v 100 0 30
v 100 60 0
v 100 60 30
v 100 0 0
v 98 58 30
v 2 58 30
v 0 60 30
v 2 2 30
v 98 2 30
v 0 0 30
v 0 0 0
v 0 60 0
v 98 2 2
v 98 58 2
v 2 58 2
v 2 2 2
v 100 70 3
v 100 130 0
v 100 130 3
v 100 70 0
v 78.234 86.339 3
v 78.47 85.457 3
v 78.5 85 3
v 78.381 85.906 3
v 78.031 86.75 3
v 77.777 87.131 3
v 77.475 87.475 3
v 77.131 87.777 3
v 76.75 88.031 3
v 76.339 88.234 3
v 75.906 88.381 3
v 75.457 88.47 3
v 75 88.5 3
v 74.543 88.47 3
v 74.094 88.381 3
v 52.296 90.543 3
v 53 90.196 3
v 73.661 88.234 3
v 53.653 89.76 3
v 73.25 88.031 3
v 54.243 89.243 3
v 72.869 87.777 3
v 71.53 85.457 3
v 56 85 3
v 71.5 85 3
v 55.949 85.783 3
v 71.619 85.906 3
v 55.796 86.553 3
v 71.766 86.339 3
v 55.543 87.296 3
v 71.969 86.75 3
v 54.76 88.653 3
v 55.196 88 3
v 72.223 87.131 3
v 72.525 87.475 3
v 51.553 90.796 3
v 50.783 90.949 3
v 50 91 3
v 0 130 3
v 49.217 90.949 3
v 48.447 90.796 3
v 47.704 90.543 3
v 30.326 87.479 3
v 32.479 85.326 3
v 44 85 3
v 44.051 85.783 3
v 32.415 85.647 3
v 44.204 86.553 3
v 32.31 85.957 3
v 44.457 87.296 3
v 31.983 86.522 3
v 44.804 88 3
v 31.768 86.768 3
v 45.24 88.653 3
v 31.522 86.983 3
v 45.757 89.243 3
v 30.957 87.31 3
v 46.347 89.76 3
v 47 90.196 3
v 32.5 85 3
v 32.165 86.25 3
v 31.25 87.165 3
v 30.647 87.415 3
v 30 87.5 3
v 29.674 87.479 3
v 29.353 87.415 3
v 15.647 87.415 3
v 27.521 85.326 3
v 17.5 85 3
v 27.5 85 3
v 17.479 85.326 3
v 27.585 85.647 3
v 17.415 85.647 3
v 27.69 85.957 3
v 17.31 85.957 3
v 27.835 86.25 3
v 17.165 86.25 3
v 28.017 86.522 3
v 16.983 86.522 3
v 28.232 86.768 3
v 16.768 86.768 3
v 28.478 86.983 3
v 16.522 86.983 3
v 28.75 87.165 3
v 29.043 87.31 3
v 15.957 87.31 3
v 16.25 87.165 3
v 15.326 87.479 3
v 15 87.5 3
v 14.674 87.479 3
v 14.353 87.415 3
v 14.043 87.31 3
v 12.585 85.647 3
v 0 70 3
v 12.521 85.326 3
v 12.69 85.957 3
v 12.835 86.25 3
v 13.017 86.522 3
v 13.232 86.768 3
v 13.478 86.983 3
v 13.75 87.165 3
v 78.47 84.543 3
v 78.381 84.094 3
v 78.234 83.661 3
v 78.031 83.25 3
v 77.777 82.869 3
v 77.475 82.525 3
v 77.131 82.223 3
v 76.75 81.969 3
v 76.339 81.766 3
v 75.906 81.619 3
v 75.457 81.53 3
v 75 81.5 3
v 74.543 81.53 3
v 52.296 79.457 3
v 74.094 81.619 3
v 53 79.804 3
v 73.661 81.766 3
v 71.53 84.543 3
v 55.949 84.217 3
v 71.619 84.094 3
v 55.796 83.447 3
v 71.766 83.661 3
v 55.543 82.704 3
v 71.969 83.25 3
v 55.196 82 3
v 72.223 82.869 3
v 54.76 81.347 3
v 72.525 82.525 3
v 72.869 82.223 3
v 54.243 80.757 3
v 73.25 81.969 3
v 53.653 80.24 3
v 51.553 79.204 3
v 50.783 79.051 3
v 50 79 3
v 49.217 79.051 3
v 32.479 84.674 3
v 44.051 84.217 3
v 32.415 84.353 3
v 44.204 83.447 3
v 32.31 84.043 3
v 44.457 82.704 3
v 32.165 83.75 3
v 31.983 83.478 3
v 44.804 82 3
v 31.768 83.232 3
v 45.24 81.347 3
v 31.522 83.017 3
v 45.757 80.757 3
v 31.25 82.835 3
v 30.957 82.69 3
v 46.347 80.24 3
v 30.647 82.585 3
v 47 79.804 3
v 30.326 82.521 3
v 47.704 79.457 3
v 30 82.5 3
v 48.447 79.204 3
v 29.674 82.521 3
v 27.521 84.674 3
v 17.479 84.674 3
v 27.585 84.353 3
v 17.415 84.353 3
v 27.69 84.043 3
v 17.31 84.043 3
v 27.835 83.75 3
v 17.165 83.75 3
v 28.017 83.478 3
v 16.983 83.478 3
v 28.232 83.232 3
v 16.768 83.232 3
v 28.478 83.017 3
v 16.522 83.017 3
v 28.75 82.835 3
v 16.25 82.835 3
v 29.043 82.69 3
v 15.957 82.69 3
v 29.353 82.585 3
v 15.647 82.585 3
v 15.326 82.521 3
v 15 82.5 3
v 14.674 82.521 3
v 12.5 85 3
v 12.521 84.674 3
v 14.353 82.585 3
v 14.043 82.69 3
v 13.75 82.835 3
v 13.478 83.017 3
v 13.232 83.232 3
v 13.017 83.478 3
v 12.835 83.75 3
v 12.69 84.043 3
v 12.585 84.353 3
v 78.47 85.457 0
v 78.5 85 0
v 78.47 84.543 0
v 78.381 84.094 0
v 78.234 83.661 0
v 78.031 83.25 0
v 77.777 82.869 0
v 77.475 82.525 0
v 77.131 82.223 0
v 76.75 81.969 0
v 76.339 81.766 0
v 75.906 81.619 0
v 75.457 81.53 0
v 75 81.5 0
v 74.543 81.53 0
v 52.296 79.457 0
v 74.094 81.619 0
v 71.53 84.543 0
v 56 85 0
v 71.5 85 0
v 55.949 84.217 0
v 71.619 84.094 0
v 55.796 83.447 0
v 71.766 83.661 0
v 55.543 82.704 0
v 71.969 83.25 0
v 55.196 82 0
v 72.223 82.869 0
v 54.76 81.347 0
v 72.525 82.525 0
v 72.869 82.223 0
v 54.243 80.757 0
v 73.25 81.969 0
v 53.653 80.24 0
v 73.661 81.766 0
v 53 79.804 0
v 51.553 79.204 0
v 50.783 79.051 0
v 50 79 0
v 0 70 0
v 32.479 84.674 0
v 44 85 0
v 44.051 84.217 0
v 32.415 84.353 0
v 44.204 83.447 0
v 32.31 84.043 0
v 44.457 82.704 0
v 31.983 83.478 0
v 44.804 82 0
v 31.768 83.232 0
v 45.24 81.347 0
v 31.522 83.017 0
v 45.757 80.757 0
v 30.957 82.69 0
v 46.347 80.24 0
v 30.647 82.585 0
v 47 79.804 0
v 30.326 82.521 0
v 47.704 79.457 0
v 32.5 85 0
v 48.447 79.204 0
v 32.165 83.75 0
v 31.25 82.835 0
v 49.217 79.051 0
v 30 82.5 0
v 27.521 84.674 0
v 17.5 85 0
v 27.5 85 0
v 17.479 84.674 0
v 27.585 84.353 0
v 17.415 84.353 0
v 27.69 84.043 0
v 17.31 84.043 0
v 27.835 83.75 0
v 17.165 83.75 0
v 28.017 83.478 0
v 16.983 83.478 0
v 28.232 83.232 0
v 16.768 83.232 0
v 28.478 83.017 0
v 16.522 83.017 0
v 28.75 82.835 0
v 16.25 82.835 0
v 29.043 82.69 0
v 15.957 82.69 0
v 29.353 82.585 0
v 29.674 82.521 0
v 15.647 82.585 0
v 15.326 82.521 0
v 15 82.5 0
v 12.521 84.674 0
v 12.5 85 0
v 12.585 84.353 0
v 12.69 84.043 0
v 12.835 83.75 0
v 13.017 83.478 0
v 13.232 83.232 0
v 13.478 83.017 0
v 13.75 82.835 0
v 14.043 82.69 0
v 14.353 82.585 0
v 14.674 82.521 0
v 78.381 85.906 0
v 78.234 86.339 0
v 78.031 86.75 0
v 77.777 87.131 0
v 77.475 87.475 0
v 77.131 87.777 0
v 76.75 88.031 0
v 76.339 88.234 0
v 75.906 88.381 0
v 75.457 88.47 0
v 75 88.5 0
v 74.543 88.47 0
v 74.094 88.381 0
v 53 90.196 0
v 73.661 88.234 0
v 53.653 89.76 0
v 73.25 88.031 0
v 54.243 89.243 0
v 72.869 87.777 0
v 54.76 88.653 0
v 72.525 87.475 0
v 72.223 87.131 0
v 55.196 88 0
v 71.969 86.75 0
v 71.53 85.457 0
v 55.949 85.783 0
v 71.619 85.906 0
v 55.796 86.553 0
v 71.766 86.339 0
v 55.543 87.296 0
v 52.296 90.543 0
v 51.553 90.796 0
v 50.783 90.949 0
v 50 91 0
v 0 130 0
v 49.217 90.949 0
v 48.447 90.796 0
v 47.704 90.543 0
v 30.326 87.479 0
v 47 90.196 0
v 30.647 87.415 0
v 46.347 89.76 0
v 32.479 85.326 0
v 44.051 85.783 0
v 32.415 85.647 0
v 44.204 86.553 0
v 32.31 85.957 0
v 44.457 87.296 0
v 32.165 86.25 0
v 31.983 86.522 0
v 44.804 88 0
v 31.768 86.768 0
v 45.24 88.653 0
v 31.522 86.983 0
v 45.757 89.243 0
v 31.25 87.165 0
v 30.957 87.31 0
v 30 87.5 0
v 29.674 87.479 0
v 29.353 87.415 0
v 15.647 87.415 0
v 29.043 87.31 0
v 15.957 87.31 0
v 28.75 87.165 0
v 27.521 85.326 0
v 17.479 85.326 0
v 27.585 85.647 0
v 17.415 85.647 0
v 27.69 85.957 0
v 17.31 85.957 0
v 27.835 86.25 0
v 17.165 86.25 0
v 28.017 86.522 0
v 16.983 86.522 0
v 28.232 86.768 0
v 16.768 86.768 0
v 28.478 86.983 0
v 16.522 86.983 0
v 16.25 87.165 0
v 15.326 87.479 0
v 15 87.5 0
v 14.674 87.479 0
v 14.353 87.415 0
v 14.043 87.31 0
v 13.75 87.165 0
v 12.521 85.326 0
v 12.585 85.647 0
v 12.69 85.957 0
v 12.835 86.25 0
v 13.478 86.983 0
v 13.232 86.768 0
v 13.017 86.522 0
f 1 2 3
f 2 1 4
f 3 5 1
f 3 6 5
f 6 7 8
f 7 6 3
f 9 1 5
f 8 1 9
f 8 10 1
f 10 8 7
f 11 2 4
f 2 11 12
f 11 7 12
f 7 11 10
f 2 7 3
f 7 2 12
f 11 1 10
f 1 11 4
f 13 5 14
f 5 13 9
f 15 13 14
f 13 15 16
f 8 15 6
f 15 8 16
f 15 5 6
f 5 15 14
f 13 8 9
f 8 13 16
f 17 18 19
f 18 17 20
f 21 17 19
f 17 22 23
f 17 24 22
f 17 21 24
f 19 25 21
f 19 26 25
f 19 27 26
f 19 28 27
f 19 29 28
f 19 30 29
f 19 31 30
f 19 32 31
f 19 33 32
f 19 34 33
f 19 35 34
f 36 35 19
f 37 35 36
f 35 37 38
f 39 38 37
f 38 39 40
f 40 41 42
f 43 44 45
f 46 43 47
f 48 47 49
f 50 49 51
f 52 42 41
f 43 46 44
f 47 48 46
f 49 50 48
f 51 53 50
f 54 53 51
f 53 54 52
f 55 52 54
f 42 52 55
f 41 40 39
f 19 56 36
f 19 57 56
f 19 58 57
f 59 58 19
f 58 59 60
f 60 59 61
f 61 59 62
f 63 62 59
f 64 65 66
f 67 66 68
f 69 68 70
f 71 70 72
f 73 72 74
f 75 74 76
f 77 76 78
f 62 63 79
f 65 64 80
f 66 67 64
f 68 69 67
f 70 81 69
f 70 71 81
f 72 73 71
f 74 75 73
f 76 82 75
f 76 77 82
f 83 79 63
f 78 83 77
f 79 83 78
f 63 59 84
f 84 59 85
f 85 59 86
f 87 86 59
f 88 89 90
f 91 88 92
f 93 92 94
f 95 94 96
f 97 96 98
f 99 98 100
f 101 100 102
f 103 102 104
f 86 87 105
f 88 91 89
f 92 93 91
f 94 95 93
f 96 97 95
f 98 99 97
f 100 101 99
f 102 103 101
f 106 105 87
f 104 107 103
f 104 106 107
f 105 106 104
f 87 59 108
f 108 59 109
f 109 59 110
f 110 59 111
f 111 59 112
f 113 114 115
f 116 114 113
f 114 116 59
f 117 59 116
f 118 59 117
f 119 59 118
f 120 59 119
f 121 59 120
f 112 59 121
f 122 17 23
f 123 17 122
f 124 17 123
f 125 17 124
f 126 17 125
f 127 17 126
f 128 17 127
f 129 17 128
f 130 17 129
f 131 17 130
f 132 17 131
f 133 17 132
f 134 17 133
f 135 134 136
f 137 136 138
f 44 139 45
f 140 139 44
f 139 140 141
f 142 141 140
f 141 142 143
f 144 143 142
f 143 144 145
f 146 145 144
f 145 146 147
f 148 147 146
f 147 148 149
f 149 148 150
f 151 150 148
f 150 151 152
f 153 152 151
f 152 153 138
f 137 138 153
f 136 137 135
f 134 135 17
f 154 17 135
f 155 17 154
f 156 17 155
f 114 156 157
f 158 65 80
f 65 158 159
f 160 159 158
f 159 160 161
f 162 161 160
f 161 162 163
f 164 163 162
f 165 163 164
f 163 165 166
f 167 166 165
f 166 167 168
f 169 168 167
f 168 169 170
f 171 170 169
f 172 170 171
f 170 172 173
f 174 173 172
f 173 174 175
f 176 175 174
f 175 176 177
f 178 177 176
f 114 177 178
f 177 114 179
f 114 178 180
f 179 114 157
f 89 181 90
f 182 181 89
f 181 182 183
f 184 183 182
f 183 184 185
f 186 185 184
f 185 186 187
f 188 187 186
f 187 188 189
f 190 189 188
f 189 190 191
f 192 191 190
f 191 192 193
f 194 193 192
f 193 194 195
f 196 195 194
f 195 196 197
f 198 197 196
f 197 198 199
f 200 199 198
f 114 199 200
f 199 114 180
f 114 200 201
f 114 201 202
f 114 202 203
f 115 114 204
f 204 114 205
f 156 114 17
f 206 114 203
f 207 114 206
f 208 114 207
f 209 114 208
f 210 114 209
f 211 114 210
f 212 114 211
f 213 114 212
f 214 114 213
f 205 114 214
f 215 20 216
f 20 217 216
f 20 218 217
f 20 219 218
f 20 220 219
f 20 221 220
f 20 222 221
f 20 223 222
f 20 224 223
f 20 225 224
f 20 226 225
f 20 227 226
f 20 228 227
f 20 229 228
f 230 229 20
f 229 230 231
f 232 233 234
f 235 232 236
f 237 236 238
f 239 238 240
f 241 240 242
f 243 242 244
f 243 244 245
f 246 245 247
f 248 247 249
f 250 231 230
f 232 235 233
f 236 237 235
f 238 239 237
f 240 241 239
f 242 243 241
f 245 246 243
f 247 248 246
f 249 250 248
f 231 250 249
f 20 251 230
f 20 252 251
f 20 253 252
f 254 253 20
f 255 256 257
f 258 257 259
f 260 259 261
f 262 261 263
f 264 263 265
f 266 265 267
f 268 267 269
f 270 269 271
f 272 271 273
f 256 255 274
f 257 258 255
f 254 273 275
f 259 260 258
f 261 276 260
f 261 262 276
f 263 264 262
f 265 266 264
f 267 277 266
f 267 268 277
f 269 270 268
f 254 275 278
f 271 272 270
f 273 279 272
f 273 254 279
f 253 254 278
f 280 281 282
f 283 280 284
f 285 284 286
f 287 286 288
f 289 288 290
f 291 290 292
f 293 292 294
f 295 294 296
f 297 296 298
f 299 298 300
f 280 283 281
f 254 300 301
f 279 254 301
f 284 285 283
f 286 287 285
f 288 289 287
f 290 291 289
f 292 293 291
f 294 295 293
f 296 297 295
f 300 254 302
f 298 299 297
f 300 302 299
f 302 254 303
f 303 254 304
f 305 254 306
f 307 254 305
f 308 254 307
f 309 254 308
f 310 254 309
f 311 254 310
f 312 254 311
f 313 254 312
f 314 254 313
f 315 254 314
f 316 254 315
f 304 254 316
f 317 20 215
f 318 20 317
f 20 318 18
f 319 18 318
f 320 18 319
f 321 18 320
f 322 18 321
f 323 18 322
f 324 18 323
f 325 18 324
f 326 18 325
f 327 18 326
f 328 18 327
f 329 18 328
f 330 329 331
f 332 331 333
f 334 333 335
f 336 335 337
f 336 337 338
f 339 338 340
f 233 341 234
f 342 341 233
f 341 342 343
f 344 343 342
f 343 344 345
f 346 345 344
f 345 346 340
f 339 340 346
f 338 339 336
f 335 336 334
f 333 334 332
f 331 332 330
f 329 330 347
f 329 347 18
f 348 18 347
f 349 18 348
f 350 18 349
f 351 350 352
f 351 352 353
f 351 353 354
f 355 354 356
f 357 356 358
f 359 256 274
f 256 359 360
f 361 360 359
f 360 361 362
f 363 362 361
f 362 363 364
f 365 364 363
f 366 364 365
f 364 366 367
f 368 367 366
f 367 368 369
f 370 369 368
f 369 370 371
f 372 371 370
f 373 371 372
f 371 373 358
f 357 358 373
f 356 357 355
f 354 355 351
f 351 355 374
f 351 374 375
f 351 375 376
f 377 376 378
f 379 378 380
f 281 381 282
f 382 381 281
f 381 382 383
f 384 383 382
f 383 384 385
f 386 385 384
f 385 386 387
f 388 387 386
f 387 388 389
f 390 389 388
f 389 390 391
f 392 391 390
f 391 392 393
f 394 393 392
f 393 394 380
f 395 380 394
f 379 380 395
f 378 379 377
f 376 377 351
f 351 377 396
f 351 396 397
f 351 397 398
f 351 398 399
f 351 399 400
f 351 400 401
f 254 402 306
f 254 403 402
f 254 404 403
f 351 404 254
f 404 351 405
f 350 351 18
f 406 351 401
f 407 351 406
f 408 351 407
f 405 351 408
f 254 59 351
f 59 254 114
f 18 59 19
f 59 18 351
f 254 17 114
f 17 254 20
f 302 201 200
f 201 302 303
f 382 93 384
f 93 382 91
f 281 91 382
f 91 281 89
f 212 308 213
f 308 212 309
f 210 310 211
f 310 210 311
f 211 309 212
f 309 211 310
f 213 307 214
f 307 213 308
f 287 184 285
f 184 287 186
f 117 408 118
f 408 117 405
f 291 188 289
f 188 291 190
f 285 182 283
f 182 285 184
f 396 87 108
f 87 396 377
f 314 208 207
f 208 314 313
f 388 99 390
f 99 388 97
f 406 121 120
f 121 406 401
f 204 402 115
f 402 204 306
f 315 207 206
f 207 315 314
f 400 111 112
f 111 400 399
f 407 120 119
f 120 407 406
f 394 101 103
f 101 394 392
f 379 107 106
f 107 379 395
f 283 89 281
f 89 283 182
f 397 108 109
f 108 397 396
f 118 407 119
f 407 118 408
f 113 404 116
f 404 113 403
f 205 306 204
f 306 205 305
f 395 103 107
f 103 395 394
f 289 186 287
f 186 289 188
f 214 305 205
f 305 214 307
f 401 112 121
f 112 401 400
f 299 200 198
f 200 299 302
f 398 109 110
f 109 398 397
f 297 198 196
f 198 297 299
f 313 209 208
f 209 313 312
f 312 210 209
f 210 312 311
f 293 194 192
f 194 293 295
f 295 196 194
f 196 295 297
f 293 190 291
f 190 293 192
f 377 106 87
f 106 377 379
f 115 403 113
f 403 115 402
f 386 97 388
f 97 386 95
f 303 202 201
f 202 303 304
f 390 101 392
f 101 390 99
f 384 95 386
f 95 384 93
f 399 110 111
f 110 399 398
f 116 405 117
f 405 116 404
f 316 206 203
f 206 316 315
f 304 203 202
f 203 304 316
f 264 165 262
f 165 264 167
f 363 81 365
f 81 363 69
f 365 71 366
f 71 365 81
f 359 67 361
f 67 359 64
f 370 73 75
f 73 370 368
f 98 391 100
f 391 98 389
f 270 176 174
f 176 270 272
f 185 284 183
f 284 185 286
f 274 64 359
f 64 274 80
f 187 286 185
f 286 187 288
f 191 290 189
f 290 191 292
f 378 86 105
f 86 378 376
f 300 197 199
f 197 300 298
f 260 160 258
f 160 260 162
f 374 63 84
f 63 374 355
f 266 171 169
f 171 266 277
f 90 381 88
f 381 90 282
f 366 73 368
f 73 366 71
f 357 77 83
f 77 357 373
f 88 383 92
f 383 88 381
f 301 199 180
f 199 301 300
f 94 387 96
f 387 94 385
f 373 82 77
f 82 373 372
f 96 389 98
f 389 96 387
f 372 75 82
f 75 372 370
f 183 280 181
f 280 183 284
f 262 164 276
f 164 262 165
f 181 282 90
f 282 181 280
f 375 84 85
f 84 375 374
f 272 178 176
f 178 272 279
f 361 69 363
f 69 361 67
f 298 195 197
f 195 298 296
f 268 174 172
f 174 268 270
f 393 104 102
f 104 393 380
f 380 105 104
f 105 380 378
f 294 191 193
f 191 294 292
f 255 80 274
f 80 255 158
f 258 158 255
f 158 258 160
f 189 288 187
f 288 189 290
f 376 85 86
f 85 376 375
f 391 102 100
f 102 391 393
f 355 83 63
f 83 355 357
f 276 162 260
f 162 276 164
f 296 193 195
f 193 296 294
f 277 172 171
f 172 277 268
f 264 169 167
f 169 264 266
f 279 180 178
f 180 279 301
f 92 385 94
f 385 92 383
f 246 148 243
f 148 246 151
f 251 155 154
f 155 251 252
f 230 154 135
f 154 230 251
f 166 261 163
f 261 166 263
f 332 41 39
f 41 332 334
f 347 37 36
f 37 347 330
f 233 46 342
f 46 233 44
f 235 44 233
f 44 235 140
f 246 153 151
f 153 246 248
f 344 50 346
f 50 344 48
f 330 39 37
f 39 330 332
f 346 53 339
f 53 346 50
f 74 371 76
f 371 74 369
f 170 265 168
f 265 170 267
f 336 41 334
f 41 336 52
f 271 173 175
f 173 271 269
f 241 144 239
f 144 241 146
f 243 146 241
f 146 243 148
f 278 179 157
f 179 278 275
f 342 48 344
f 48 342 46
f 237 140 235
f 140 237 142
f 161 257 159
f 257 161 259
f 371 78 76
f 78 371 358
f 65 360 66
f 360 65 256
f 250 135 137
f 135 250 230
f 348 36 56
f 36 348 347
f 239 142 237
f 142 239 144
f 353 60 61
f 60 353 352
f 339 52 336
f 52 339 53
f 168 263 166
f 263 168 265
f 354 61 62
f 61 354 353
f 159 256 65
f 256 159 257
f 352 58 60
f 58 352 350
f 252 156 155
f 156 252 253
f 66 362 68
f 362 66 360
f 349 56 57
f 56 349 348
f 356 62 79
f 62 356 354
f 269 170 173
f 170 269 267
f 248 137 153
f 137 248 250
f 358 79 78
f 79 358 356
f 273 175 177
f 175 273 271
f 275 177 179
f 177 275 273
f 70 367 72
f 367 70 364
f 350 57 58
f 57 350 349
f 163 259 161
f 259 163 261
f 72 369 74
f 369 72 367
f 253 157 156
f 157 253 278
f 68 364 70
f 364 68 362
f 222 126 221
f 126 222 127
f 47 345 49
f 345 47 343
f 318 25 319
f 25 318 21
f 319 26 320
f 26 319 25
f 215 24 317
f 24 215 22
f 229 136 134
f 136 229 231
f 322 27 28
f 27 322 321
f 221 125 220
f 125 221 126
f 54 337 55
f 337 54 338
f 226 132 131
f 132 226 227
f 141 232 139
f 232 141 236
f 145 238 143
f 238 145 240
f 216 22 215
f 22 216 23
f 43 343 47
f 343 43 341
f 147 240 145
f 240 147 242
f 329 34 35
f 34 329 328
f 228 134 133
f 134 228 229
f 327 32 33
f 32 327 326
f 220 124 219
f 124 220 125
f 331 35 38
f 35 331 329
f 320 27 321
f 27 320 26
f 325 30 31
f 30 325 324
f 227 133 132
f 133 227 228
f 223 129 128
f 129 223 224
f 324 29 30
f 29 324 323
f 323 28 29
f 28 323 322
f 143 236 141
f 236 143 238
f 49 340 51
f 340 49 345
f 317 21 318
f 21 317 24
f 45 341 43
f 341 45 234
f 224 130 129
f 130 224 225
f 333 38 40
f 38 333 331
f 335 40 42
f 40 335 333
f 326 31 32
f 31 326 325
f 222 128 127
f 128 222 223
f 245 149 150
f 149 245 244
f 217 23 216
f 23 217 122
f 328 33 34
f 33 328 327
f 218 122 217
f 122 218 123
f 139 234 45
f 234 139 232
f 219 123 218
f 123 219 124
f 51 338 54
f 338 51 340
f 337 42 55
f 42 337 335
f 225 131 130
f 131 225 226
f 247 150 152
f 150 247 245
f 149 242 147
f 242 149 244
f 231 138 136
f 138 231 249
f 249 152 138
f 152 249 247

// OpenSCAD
// Boiler Alert enclosure - printable concept
$fn = 48;
box_w = 100;
box_h = 60;
box_d = 30;
wall = 2;

module base_box() {
  difference() {
    cube([box_w, box_h, box_d]);
    translate([wall, wall, wall])
      cube([box_w-2*wall, box_h-2*wall, box_d]);
  }
}

module lid() {
  difference() {
    cube([box_w, box_h, 3]);
    translate([15, 15, -1]) cylinder(h=6, d=5);   // red LED
    translate([30, 15, -1]) cylinder(h=6, d=5);   // green LED
    translate([50, 15, -1]) cylinder(h=6, d=12);  // buzzer
    translate([75, 15, -1]) cylinder(h=6, d=7);   // mute
  }
}

base_box();
translate([0, 70, 0]) lid();
